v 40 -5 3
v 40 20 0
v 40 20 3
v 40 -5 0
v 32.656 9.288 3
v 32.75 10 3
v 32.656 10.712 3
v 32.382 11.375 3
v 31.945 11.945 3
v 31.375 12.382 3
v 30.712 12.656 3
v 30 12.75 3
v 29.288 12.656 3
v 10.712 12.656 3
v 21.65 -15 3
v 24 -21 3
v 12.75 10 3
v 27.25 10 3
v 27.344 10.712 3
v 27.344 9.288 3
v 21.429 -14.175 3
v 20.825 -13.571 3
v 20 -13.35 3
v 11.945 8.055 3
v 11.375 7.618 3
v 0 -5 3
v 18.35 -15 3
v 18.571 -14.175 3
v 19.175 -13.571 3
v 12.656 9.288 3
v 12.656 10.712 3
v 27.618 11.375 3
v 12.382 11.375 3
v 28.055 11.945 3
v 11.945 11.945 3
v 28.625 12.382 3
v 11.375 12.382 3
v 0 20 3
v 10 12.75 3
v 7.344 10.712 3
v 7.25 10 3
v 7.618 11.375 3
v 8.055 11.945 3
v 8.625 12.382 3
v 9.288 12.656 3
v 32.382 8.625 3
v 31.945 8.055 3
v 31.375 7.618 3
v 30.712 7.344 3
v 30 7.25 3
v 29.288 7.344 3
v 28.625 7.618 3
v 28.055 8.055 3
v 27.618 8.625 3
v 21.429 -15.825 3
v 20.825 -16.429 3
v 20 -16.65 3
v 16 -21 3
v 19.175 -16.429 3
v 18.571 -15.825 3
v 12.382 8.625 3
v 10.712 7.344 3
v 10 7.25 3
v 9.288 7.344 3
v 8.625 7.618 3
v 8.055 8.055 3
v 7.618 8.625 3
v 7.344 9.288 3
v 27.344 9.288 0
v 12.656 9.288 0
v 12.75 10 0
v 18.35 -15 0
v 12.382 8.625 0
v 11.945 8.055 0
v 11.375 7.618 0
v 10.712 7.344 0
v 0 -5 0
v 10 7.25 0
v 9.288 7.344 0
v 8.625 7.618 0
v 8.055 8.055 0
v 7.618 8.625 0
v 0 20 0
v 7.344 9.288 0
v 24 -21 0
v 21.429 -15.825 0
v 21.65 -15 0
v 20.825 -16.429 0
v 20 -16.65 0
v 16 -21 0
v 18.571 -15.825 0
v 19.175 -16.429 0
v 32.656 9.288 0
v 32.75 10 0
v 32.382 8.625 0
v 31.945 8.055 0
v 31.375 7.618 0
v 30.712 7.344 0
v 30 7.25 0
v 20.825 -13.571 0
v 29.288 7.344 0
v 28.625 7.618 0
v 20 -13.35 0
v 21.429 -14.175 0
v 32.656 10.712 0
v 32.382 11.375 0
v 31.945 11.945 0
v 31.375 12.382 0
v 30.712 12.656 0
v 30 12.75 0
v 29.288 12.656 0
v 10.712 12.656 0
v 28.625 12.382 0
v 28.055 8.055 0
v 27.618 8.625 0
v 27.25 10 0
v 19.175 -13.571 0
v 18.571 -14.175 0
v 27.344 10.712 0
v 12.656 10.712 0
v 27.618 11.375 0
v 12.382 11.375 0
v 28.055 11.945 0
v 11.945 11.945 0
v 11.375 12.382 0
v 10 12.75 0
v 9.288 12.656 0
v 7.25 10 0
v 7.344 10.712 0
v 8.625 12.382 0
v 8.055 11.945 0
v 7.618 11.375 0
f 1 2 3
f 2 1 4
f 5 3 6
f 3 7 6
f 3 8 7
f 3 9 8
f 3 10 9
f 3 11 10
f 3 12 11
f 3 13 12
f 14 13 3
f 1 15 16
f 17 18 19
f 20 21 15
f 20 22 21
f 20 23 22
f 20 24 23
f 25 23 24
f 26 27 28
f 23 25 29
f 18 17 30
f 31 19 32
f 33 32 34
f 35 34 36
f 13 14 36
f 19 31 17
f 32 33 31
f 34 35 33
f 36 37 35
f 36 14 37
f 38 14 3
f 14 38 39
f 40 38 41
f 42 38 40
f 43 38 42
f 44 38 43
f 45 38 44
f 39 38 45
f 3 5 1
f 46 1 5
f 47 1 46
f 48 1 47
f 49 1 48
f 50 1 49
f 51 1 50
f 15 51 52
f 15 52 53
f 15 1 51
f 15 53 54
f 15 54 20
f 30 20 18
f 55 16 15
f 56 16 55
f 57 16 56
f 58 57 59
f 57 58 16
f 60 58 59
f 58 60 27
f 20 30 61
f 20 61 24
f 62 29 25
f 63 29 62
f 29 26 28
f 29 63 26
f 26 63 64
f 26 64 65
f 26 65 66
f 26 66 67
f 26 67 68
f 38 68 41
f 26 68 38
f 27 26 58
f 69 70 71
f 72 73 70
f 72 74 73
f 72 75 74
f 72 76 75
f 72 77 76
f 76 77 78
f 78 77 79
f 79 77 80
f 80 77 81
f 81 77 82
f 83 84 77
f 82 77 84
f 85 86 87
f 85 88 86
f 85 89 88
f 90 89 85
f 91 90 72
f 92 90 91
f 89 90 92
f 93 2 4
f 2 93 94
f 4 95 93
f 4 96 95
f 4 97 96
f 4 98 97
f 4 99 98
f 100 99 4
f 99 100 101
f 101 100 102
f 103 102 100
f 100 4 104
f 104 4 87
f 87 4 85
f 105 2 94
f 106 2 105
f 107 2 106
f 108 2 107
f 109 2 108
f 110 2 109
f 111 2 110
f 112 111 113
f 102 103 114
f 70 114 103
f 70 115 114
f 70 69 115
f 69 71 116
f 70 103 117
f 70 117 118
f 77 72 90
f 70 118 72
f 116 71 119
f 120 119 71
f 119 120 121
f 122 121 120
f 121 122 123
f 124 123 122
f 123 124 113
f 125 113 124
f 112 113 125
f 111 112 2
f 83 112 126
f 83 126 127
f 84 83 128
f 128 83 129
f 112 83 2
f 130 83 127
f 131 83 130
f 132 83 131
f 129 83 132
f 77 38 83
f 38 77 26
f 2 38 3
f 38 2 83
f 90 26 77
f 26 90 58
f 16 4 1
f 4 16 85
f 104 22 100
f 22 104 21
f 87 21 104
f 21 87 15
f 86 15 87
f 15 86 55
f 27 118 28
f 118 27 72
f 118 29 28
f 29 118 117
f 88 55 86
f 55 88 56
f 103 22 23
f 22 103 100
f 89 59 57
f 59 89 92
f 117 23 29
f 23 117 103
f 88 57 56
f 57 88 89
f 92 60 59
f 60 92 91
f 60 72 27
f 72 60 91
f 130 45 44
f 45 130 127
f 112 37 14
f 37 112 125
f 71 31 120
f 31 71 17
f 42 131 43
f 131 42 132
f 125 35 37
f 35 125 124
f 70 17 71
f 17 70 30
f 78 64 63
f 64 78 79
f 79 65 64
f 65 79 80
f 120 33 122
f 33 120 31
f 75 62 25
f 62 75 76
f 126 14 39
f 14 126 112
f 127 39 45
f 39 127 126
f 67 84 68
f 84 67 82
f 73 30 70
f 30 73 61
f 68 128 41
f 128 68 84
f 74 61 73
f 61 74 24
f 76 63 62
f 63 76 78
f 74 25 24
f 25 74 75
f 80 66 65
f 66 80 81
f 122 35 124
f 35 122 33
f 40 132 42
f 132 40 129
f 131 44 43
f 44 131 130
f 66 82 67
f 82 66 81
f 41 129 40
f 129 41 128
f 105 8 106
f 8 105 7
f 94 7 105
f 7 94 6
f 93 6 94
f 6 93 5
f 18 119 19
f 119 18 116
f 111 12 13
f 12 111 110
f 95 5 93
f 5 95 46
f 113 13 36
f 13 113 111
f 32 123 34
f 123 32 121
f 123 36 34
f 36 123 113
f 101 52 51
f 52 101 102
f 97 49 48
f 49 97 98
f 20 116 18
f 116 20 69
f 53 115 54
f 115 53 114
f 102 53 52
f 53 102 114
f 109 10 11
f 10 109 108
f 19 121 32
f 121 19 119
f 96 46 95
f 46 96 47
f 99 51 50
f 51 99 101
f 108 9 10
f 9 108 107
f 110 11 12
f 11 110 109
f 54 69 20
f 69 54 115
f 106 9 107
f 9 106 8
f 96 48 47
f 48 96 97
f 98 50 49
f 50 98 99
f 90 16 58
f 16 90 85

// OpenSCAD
difference()
{
    union()
    {
        cube([40,20,3]);
        
        translate([20,-20-5,0])
            rotate([0,0,45])
                cube([40,40,3]);
    }
    union()
    {
        translate([20,-20+5,0])
            cylinder(d=3.3,h=3,$fn=12);
        
        translate([10,10,0])
            cylinder(d=5.5,h=3,$fn=24);
        translate([30,10,0])
            cylinder(d=5.5,h=3,$fn=24);
        
        translate([0,-20-5,0])
            cube([40,4,3]);
        
        translate([0,20,0])
            cube([40,20,3]);
        
        translate([-20,-10,0])
            cube([20,30,3]);
        translate([40,-10,0])
            cube([20,30,3]);
    }
}
